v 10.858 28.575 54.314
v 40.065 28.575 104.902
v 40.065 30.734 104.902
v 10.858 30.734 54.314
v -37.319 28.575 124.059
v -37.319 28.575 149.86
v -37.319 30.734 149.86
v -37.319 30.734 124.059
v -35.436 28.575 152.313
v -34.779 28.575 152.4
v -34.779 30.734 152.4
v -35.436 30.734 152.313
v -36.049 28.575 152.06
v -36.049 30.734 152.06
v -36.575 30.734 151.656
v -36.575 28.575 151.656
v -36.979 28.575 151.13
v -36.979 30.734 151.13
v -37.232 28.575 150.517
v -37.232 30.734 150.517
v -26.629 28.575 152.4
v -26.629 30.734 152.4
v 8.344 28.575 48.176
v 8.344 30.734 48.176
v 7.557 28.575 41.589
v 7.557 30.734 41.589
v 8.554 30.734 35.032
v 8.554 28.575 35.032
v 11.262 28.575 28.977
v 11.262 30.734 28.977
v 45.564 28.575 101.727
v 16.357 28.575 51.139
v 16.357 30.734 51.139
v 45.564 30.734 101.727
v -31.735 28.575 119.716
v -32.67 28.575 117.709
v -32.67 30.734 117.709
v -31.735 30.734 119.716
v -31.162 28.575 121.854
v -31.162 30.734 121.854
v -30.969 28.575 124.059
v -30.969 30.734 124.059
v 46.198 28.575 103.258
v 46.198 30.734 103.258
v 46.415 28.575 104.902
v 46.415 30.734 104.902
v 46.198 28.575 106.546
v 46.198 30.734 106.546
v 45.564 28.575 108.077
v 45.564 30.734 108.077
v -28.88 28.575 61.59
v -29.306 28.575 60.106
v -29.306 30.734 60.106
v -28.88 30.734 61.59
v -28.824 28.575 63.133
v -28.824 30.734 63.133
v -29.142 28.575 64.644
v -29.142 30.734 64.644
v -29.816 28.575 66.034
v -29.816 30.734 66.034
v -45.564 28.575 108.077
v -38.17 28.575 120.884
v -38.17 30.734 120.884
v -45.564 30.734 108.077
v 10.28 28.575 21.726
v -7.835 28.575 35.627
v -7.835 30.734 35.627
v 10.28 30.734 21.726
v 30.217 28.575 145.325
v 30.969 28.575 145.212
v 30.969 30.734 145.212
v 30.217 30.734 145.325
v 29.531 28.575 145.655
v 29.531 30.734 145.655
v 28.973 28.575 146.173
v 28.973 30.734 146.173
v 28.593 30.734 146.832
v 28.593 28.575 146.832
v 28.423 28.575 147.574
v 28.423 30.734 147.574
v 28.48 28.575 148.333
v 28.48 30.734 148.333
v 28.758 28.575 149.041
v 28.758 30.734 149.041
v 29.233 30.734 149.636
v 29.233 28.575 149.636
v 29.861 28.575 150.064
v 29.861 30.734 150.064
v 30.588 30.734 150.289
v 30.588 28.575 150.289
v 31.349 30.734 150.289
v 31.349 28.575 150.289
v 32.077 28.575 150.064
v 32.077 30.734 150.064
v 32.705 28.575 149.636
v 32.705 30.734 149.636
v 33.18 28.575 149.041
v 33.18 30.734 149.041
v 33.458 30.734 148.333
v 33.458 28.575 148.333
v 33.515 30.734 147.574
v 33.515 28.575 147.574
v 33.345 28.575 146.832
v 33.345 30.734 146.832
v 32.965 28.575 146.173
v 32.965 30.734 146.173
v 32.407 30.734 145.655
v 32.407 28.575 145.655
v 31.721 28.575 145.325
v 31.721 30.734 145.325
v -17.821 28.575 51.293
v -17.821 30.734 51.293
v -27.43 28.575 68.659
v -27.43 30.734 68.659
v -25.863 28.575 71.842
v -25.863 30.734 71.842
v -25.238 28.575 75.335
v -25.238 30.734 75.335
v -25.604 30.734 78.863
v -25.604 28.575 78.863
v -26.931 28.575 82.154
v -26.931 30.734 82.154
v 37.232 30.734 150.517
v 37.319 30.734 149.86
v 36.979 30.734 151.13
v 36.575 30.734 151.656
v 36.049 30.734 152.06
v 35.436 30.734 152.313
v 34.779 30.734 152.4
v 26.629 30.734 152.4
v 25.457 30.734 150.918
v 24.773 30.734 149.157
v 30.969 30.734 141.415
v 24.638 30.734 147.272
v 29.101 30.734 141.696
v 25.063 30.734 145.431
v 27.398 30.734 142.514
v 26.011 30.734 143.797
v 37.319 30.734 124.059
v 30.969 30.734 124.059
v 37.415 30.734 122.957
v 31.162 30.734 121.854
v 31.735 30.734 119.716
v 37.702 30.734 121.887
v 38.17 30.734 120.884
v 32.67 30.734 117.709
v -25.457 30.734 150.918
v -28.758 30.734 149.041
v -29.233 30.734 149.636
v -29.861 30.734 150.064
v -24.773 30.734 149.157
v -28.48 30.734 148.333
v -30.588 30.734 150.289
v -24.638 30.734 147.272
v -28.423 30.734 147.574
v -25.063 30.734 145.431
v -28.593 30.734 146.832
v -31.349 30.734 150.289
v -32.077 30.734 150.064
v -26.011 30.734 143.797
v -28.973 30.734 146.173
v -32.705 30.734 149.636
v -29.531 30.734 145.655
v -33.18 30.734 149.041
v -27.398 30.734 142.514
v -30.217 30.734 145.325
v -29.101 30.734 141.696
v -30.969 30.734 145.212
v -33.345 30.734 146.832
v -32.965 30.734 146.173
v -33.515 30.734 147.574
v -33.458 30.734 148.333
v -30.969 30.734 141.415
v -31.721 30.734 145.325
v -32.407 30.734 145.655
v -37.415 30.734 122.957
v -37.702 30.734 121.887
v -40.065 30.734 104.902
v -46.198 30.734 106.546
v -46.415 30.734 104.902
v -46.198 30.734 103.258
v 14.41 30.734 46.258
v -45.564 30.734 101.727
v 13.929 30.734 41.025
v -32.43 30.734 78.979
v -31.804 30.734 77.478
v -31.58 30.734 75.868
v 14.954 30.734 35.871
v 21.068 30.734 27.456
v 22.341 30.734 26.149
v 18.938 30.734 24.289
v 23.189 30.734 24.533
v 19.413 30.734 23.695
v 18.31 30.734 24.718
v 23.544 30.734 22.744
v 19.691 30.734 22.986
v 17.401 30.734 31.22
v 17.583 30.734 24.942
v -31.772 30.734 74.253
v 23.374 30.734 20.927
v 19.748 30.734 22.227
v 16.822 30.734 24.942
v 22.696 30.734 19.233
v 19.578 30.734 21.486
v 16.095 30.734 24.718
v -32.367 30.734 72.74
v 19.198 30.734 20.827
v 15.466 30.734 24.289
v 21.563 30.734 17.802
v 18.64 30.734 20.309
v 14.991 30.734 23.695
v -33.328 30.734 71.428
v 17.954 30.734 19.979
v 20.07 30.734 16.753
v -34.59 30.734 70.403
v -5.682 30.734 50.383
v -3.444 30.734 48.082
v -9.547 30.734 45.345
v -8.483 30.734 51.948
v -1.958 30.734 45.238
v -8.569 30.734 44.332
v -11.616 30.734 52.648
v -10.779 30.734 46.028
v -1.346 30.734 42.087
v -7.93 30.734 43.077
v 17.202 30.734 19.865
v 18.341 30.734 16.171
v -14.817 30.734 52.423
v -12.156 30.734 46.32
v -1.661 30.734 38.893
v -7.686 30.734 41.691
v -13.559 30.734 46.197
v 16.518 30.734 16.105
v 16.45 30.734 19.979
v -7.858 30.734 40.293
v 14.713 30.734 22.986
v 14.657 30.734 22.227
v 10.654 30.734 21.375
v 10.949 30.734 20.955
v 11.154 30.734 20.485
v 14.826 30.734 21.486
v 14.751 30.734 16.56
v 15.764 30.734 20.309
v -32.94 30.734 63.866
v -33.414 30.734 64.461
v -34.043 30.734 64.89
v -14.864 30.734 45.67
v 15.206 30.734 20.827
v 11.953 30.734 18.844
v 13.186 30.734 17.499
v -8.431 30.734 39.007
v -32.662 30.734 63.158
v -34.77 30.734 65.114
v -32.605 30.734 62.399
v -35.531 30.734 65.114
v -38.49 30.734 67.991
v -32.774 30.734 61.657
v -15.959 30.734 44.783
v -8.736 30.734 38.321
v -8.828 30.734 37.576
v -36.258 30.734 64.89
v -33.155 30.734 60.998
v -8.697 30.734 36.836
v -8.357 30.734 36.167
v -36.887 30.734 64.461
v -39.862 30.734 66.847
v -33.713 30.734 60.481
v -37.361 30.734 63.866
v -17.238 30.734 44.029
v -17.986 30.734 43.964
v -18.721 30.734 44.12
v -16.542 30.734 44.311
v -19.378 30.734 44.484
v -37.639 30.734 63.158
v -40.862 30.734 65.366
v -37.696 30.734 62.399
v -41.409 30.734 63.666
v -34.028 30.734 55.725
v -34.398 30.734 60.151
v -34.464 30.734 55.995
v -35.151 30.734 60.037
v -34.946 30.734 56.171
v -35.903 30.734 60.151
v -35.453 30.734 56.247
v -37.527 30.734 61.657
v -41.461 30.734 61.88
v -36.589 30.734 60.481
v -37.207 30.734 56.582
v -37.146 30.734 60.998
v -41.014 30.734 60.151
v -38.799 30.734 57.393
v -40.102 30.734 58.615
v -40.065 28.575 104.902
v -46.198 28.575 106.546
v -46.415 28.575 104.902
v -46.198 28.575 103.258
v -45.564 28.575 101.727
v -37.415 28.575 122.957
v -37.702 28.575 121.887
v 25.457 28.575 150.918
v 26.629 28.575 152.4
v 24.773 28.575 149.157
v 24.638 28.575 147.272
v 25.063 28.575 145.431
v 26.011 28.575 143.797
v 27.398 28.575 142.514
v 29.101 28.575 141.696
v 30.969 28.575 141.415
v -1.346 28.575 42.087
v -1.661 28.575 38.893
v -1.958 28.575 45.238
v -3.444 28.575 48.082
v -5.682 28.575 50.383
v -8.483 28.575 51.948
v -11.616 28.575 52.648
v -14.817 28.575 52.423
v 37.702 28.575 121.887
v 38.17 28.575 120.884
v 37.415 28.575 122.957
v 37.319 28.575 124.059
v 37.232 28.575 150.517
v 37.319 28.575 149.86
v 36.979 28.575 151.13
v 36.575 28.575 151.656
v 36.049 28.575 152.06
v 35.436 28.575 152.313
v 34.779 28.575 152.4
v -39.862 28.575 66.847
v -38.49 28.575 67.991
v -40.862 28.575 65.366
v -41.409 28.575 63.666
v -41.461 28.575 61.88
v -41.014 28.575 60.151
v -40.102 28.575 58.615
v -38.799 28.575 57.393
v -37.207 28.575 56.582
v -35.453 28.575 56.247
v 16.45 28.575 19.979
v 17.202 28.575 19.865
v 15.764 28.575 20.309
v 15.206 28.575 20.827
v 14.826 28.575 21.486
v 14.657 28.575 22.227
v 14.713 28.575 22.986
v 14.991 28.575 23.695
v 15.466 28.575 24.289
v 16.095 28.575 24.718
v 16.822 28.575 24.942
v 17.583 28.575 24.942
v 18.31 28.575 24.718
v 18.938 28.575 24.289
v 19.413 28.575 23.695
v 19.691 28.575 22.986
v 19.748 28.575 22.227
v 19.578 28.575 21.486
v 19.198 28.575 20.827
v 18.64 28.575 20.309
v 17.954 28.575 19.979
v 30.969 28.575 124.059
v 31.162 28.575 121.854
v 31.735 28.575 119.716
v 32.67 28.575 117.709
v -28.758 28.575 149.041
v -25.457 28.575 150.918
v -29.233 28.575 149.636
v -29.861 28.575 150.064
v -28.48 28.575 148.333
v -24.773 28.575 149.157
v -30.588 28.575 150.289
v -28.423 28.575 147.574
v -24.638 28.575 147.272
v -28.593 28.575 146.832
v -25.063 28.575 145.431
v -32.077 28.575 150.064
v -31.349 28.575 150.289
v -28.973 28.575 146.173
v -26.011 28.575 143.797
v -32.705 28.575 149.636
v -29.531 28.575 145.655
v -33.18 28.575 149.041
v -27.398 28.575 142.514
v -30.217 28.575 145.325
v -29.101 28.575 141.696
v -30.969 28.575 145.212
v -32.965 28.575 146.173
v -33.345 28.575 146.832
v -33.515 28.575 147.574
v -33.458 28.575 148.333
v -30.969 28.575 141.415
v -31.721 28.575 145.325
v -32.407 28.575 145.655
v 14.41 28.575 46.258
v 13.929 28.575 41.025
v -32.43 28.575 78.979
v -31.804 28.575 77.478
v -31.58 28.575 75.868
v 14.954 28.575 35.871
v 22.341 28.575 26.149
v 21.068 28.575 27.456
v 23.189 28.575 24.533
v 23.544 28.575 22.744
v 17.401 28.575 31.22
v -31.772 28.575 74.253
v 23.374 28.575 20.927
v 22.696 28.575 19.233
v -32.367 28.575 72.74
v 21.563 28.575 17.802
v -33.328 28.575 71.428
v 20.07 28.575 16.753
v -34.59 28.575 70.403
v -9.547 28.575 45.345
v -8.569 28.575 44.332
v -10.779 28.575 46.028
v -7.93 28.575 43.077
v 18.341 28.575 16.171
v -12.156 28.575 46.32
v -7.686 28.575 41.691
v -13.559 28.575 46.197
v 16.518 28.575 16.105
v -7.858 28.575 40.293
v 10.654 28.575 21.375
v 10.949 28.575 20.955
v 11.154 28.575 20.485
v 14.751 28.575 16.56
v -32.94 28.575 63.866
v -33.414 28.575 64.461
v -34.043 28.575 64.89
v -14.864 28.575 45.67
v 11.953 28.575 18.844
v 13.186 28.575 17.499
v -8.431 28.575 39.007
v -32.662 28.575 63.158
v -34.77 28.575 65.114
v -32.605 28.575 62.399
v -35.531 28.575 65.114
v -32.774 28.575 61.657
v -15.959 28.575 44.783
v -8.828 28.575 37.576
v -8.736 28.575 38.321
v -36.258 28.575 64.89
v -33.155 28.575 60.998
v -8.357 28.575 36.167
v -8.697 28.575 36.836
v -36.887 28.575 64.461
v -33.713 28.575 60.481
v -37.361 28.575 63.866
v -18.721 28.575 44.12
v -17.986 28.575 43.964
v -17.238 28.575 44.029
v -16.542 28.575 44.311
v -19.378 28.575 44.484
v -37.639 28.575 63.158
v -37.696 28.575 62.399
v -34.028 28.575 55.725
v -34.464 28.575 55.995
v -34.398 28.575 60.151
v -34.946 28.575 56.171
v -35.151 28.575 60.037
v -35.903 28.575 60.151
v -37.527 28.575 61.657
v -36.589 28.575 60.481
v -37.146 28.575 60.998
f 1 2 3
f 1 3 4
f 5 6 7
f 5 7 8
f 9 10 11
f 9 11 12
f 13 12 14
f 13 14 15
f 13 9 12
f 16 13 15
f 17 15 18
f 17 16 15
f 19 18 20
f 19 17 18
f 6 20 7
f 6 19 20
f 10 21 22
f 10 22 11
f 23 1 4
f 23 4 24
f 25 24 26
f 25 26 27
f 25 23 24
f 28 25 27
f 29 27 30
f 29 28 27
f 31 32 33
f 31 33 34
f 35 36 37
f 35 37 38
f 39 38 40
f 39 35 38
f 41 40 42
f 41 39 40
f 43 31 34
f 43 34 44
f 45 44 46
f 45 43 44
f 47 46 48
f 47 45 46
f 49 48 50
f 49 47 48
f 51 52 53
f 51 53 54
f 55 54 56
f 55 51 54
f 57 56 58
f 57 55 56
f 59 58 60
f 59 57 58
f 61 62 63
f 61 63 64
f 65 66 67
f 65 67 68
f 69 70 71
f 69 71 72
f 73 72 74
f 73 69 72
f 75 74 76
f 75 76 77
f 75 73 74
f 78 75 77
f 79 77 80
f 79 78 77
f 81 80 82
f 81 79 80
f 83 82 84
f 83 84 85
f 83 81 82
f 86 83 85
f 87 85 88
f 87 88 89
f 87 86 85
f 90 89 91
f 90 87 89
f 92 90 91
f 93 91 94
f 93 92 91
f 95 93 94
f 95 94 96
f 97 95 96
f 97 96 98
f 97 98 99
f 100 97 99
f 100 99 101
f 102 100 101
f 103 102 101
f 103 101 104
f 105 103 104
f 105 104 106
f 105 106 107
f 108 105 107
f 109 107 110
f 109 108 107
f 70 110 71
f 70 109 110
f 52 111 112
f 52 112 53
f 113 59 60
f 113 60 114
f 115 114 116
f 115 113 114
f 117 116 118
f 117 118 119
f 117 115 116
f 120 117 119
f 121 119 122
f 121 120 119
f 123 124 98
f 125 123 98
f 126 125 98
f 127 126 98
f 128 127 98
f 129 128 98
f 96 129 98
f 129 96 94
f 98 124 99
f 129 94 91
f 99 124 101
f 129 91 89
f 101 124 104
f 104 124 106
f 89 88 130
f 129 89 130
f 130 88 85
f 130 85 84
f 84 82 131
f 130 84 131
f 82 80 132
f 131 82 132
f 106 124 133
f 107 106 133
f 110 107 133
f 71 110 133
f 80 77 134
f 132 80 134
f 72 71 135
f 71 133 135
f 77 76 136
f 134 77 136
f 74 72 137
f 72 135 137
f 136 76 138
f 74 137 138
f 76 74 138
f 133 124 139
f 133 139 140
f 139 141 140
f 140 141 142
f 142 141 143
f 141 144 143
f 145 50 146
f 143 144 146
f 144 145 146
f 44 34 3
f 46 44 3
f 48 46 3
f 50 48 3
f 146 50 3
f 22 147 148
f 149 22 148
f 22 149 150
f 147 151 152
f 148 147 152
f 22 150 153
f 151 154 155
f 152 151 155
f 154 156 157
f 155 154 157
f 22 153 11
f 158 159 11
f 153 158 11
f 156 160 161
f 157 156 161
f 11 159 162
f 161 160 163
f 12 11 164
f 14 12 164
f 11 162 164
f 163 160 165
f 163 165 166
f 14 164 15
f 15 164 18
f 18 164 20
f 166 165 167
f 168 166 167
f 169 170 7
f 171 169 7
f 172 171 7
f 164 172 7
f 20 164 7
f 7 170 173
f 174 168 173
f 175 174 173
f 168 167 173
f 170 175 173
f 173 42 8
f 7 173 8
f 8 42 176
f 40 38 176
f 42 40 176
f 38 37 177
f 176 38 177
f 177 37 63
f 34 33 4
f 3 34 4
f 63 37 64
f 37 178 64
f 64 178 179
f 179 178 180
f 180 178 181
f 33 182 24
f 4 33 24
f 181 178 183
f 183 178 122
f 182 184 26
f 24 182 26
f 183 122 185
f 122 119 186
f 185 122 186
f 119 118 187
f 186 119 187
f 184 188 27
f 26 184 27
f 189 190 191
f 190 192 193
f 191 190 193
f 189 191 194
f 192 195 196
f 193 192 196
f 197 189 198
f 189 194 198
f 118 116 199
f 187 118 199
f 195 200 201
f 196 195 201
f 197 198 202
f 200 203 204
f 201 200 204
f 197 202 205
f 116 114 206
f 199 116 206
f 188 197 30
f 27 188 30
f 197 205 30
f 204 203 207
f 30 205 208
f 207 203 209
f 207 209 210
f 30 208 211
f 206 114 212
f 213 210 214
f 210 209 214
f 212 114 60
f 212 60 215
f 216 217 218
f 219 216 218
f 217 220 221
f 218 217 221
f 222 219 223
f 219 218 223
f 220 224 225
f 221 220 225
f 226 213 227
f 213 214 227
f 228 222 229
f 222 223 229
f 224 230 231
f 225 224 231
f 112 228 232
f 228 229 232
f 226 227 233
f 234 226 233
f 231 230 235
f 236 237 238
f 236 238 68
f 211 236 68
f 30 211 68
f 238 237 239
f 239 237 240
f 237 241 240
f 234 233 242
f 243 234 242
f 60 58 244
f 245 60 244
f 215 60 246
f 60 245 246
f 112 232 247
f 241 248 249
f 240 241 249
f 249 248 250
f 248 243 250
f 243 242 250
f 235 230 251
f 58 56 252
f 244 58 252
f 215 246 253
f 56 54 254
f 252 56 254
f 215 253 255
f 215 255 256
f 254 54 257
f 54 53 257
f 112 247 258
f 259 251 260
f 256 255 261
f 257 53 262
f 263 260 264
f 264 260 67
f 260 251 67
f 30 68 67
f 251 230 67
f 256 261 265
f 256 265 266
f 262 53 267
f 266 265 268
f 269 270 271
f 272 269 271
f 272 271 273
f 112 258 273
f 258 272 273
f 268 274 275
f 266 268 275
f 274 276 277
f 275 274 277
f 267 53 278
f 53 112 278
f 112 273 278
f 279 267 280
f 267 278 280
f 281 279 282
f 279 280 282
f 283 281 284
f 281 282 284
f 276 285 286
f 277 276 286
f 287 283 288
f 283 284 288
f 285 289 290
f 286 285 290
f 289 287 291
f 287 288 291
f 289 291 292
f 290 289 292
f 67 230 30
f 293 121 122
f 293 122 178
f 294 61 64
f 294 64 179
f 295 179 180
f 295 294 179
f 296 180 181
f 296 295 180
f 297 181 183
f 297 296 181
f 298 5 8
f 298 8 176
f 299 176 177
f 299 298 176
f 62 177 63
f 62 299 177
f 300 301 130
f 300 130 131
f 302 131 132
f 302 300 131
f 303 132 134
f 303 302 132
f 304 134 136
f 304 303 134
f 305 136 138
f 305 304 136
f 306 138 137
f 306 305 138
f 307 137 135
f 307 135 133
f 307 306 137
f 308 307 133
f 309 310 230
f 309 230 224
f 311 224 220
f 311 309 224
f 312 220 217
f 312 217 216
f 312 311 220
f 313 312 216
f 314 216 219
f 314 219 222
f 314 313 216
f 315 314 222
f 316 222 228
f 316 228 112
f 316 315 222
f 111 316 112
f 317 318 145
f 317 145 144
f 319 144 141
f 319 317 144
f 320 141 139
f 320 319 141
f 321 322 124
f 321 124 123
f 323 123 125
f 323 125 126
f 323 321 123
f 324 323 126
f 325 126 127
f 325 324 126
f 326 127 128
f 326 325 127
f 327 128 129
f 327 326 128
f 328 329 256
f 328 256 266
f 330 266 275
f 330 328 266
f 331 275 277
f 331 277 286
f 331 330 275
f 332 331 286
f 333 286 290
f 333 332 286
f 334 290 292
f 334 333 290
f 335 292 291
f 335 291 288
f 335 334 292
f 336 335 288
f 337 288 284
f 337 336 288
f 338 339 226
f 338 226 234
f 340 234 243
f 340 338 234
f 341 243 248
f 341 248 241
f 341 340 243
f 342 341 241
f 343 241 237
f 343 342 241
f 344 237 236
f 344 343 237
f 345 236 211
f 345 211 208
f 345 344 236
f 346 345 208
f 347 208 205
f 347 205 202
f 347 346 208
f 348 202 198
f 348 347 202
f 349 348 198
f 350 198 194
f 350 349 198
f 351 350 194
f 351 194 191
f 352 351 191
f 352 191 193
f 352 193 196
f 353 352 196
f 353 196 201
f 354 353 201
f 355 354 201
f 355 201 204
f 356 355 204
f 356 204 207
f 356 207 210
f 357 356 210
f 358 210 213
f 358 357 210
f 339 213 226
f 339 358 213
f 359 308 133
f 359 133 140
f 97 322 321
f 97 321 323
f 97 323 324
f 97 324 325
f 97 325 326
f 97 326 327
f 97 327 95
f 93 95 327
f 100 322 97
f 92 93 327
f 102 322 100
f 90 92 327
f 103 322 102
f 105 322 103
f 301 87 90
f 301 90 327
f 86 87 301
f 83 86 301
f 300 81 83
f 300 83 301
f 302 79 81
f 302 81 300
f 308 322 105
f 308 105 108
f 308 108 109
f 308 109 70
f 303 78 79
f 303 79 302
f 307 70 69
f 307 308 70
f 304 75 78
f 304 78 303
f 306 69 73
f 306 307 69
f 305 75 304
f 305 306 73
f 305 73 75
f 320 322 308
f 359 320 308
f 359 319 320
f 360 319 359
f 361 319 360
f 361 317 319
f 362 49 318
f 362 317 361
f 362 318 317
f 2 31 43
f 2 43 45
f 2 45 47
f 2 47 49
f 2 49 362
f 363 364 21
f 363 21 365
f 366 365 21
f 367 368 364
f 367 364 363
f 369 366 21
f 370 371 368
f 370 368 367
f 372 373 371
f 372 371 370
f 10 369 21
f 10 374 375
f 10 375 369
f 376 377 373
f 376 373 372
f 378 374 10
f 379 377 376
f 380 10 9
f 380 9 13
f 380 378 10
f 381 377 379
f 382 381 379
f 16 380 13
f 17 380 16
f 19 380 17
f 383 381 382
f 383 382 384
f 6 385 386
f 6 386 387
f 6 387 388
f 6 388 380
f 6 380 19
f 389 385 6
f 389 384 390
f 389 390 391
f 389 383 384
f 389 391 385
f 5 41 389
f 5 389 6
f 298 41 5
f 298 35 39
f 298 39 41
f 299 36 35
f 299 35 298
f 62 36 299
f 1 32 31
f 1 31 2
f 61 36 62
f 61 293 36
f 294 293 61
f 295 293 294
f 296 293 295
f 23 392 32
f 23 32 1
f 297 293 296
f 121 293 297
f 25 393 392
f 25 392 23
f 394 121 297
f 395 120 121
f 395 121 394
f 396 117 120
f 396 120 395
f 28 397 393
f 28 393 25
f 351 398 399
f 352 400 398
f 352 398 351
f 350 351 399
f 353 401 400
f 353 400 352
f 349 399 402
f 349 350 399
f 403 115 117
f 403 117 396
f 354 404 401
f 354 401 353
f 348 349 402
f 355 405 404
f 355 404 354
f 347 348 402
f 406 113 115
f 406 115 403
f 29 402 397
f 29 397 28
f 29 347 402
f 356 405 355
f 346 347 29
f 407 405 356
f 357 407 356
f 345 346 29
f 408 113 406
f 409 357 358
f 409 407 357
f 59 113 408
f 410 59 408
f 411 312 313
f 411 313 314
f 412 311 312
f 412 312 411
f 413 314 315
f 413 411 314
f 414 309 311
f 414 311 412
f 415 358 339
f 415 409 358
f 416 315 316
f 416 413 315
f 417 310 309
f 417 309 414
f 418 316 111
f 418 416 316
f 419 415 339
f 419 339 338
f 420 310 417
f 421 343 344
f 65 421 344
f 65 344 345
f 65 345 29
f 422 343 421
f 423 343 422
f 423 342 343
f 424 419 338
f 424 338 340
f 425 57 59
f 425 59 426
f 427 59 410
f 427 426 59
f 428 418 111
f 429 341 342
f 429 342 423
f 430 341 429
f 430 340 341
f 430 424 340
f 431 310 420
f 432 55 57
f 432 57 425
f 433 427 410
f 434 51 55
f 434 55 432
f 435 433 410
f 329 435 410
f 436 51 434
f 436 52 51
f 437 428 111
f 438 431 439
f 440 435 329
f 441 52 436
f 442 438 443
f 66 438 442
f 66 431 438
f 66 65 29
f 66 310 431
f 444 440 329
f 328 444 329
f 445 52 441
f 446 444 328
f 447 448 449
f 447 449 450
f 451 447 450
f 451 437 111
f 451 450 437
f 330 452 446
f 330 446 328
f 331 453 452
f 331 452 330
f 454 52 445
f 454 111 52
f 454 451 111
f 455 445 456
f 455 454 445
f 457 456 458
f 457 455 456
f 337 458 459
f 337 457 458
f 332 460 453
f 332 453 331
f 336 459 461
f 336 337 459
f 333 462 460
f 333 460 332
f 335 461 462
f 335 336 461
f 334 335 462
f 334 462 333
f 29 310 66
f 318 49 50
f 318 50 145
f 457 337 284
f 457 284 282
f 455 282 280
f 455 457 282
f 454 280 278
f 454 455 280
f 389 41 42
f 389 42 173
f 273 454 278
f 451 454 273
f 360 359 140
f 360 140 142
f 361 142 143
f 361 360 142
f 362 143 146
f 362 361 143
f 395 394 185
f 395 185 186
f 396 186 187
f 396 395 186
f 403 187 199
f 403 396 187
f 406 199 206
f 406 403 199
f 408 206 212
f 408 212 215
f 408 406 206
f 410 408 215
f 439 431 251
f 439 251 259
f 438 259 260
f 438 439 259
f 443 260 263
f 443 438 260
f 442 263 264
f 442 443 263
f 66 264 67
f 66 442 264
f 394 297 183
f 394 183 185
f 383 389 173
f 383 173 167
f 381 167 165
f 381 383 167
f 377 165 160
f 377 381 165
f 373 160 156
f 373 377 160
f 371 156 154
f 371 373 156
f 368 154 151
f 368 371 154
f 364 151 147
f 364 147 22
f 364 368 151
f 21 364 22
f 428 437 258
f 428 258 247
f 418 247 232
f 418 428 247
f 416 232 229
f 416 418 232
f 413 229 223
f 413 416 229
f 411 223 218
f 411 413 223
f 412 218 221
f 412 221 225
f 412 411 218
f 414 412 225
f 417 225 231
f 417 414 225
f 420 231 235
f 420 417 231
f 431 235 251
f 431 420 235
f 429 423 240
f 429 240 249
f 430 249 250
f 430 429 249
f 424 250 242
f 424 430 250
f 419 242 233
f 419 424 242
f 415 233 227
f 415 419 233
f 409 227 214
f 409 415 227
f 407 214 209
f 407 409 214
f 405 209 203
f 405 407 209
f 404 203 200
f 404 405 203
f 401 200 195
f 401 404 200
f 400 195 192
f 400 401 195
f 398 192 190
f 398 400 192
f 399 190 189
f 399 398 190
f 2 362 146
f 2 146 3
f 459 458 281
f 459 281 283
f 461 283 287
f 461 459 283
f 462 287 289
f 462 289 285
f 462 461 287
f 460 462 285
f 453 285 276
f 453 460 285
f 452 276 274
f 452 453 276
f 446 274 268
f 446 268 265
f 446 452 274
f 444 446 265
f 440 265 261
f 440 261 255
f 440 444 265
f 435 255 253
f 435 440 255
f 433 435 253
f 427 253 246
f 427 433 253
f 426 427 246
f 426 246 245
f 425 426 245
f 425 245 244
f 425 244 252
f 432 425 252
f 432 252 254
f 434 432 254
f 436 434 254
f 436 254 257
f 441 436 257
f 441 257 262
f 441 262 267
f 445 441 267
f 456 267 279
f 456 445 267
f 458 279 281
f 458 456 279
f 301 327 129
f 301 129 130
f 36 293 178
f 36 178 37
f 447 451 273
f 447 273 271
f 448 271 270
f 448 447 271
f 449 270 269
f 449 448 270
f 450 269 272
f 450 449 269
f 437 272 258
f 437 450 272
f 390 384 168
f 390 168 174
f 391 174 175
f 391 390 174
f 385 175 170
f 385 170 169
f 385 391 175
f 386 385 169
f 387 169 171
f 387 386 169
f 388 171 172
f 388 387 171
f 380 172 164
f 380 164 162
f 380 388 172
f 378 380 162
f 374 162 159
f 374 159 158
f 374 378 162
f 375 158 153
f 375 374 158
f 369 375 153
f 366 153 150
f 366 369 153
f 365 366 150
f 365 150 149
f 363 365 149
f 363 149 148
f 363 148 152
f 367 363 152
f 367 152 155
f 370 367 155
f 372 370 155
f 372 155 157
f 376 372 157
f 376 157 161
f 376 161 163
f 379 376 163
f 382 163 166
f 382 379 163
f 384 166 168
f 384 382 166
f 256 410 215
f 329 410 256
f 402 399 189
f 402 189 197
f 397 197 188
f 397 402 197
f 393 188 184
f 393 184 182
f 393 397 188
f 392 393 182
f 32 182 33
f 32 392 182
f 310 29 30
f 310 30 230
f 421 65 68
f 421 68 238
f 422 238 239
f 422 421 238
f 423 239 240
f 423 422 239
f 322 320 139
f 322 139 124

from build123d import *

# Parameters (mm, degrees)
SKETCH44_R              = 2.5527
TOP_PLATE_EXTRUDE_DEPTH = 3.175
SKETCH82_R              = 4.7625
CUT_EXTRUDE38_DEPTH     = 3.175
SKETCH72_W              = 4.7498
SKETCH72_H              = 17.4625
SKETCH72_W_2            = 49.2125
SKETCH72_H_2            = 3.0226
SKETCH72_H_3            = 18.806813894
SKETCH72_W_3            = 12.7
SKETCH72_H_4            = 9.525
BOSS_EXTRUDE27_DEPTH    = 3.175
SKETCH86_R              = 6.35
SKETCH86_R_2            = 2.5527
BOSS_EXTRUDE31_DEPTH    = 3.175
SKETCH111_W             = 17.7673
SKETCH111_H             = 10.0965
CUT_EXTRUDE57_DEPTH     = 191.266761417
SKETCH92_W              = 4.859785226
SKETCH92_H              = 15.6845
SKETCH92_W_2            = 4.8768
SKETCH92_H_2            = 22.987
SKETCH92_W_3            = 6.1468
SKETCH92_H_3            = 3.1496
SKETCH92_W_4            = 13.95095
SKETCH92_W_5            = 15.24635
CUT_EXTRUDE44_DEPTH     = 191.266761417
SKETCH95_R              = 2.5527
CUT_EXTRUDE47_DEPTH     = 25.4
SKETCH99_R              = 3.175
CUT_EXTRUDE50_DEPTH     = 191.266761417
CUT_EXTRUDE58_DEPTH     = 191.266761417
SKETCH115_W             = 1.905
SKETCH115_H             = 7.409255477
CUT_EXTRUDE60_DEPTH     = 191.266761417
FILLET5_R               = 2.54
FILLET6_R               = 2.54
FILLET7_R               = 2.54
FILLET8_R               = 1.905
SKETCH113_R             = 0.508
CUT_EXTRUDE59_DEPTH     = 191.266761558
FILLET43_R              = 0.635
FILLET43_OF_MIRROR29_R  = 0.635
BOSS_EXTRUDE32_START    = 2.159
SKETCH116_R             = 2.5527
BOSS_EXTRUDE32_DEPTH    = 3.175
CUT_EXTRUDE61_DEPTH     = 191.315032208
BOSS_EXTRUDE33_START    = 3.175
SKETCH118_R             = 2.5527
BOSS_EXTRUDE33_DEPTH    = 3.175
SKETCH119_R             = 2.5527
CUT_EXTRUDE62_DEPTH     = 191.43046765
CUT_EXTRUDE63_DEPTH     = 191.43046765
DELETEFACE1_START       = 30.734
DELETEFACE1_OUTLINE_R   = 2.5527
DELETEFACE1_DEPTH       = 3.175
CUT_EXTRUDE64_DEPTH     = 191.43046765
FILLET44_R              = 6.35
FILLET45_R              = 1.27
FILLET46_R              = 1.27
FILLET47_R              = 3.175
FILLET48_R              = 3.175
FILLET49_R              = 2.54
SKETCH122_R             = 2.5527
BOSS_EXTRUDE34_DEPTH    = 2.159


# Read off the part's stored shape, not the designer's step: DeleteFace1
with BuildPart() as part:
    # Sketch44 → Top Plate Extrude----------- (new body)
    with BuildSketch(Plane(origin=(0, 25.4, 0), x_dir=(1, 0, 0), z_dir=(0, 1, 0))):
        with BuildLine():
            Line((-104.775, -68.124686106), (-104.775, -152.527))
            Line((-104.775, -152.527), (104.775, -152.527))
            Line((104.775, -152.527), (104.775, -68.124686106))
            Line((104.775, -68.124686106), (92.075, -68.124686106))
            Line((92.075, -68.124686106), (92.075, -62.647632589))
            Line((92.075, -62.647632589), (21.81178084, -8.732768266))
            ThreePointArc((21.81178084, -8.732768266), (18.724426226, -14.191930366), (14.302849775, -18.63983673))
            Line((14.302849775, -18.63983673), (-38.049902469, -58.811516421))
            ThreePointArc((-38.049902469, -58.811516421), (-44.800532006, -62.419803084), (-52.352752243, -63.666679691))
            Line((-52.352752243, -63.666679691), (-92.075, -63.666679691))
            Line((-92.075, -63.666679691), (-92.075, -68.124686106))
            Line((-92.075, -68.124686106), (-104.775, -68.124686106))
        make_face()
        with Locations(Location((-73.83145, -147.7645, 0), (0, 0, 90))):
            Circle(SKETCH44_R, mode=Mode.SUBTRACT)
        with Locations(Location((-59.54395, -147.7645, 0), (0, 0, 90))):
            Circle(SKETCH44_R, mode=Mode.SUBTRACT)
        with Locations(Location((-45.25645, -147.7645, 0), (0, 0, 90))):
            Circle(SKETCH44_R, mode=Mode.SUBTRACT)
        with Locations(Location((-30.96895, -147.7645, 0), (0, 0, 90))):
            Circle(SKETCH44_R, mode=Mode.SUBTRACT)
        with Locations(Location((-100.0125, -99.6315, 0), (0, 0, 270))):
            Circle(SKETCH44_R, mode=Mode.SUBTRACT)
        with Locations(Location((-100.0125, -147.7645, 0), (0, 0, 270))):
            Circle(SKETCH44_R, mode=Mode.SUBTRACT)
        with Locations(Location((100.0125, -147.7645, 0), (0, 0, 90))):
            Circle(SKETCH44_R, mode=Mode.SUBTRACT)
        with Locations(Location((100.0125, -99.6315, 0), (0, 0, 90))):
            Circle(SKETCH44_R, mode=Mode.SUBTRACT)
        with Locations(Location((30.96895, -147.7645, 0), (0, 0, 270))):
            Circle(SKETCH44_R, mode=Mode.SUBTRACT)
        with Locations(Location((45.25645, -147.7645, 0), (0, 0, 270))):
            Circle(SKETCH44_R, mode=Mode.SUBTRACT)
        with Locations(Location((59.54395, -147.7645, 0), (0, 0, 270))):
            Circle(SKETCH44_R, mode=Mode.SUBTRACT)
        with Locations(Location((73.83145, -147.7645, 0), (0, 0, 270))):
            Circle(SKETCH44_R, mode=Mode.SUBTRACT)
        with Locations(Location((-87.3125, -68.429179691, 0), (0, 0, 270))):
            Circle(SKETCH44_R, mode=Mode.SUBTRACT)
        with Locations(Location((-35.150676163, -62.589861704, 0), (0, 0, 270))):
            Circle(SKETCH44_R, mode=Mode.SUBTRACT)
        with Locations(Location((17.20207608, -22.418182013, 0), (0, 0, 270))):
            Circle(SKETCH44_R, mode=Mode.SUBTRACT)
        with Locations(Location((45.531325629, -32.936414996, 0), (0, 0, 270))):
            Circle(SKETCH44_R, mode=Mode.SUBTRACT)
        with Locations(Location((87.3125, -64.996237681, 0), (0, 0, 270))):
            Circle(SKETCH44_R, mode=Mode.SUBTRACT)
        with Locations(Location((-97.155, -85.269686106, 0), (0, 0, 270))):
            Circle(SKETCH44_R, mode=Mode.SUBTRACT)
        with Locations(Location((24.42940612, -36.754342231, 0), (0, 0, 270))):
            Circle(SKETCH44_R, mode=Mode.SUBTRACT)
        with Locations(Location((97.155, -85.269686106, 0), (0, 0, 270))):
            Circle(SKETCH44_R, mode=Mode.SUBTRACT)
    extrude(amount=TOP_PLATE_EXTRUDE_DEPTH)

    # Sketch82 → Cut-Extrude38 (cut)
    with BuildSketch(Plane(origin=(0, 28.575, 0), x_dir=(1, 0, 0), z_dir=(0, 1, 0))):
        with Locations((-52.352752243, -65.571679691)):
            Circle(SKETCH82_R)
        with Locations((-12.44667807, -41.56667131)):
            Circle(SKETCH82_R)
        with Locations((58.296246284, -39.129483192)):
            Circle(SKETCH82_R)
        with BuildLine():
            Line((21.464274093, -9.555101394), (21.81178084, -8.732768266))
            Line((21.81178084, -8.732768266), (22.214272521, -9.041610995))
            ThreePointArc((22.214272521, -9.041610995), (27.20799018, -17.139845005), (21.464274093, -9.555101394))
        make_face()
    extrude(amount=-CUT_EXTRUDE38_DEPTH, mode=Mode.SUBTRACT)

    # Sketch72 → Boss-Extrude27 (add, through all)
    with BuildSketch(Plane(origin=(0, 25.4, 0), x_dir=(1, 0, 0), z_dir=(0, 1, 0))):
        with Locations((-107.1499, -143.79575)):
            Rectangle(SKETCH72_W, SKETCH72_H)
        with Locations((-52.4002, -154.0383)):
            Rectangle(SKETCH72_W_2, SKETCH72_H_2)
        with Locations((-107.1499, -102.928093053)):
            Rectangle(SKETCH72_W, SKETCH72_H_3)
        with Locations((-6.35, -154.0383)):
            Rectangle(SKETCH72_W_3, SKETCH72_H_2)
        with Locations((-107.1499, -72.887186106)):
            Rectangle(SKETCH72_W, SKETCH72_H_4)
        with Locations((-97.155, -154.0383)):
            Rectangle(SKETCH72_W_3, SKETCH72_H_2)
    boss_extrude27 = extrude(amount=BOSS_EXTRUDE27_DEPTH)

    # Mirror22: Boss-Extrude27 across plane
    add(boss_extrude27.mirror(Plane(origin=(0, 0, 0), x_dir=(0, 0, 1), z_dir=(1, 0, 0))))

    # Sketch86 → Boss-Extrude31 (add, through all)
    # profile 1 of 5: a face of its own
    with BuildSketch(Plane(origin=(0, 28.575, 0), x_dir=(1, 0, 0), z_dir=(0, 1, 0))):
        with Locations((87.3125, -64.996237681)):
            Circle(SKETCH86_R)
        with Locations(Location((87.3125, -64.996237681, 0), (0, 0, 270))):
            Circle(SKETCH86_R_2, mode=Mode.SUBTRACT)
    # profile 2 of 5: a face of its own
    with BuildSketch(Plane(origin=(0, 28.575, 0), x_dir=(1, 0, 0), z_dir=(0, 1, 0))):
        with Locations((17.20207608, -22.418182013)):
            Circle(SKETCH86_R)
        with Locations(Location((17.20207608, -22.418182013, 0), (0, 0, 270))):
            Circle(SKETCH86_R_2, mode=Mode.SUBTRACT)
    # profile 3 of 5: a face of its own
    with BuildSketch(Plane(origin=(0, 28.575, 0), x_dir=(1, 0, 0), z_dir=(0, 1, 0))):
        with Locations((45.531325629, -32.936414996)):
            Circle(SKETCH86_R)
        with Locations(Location((45.531325629, -32.936414996, 0), (0, 0, 270))):
            Circle(SKETCH86_R_2, mode=Mode.SUBTRACT)
    # profile 4 of 5: a face of its own
    with BuildSketch(Plane(origin=(0, 28.575, 0), x_dir=(1, 0, 0), z_dir=(0, 1, 0))):
        with Locations((-35.150676163, -62.589861704)):
            Circle(SKETCH86_R)
        with Locations(Location((-35.150676163, -62.589861704, 0), (0, 0, 270))):
            Circle(SKETCH86_R_2, mode=Mode.SUBTRACT)
    # profile 5 of 5: a face of its own
    with BuildSketch(Plane(origin=(0, 28.575, 0), x_dir=(1, 0, 0), z_dir=(0, 1, 0))):
        with Locations((-87.3125, -68.429179691)):
            Circle(SKETCH86_R)
        with Locations(Location((-87.3125, -68.429179691, 0), (0, 0, 270))):
            Circle(SKETCH86_R_2, mode=Mode.SUBTRACT)
    extrude(amount=-BOSS_EXTRUDE31_DEPTH)

    # Sketch111 → Cut-Extrude57 (cut, through all)
    with BuildSketch(Plane(origin=(0, 28.575, 0), x_dir=(1, 0, 0), z_dir=(0, 1, 0))):
        with Locations((-100.64115, -72.918936106)):
            Rectangle(SKETCH111_W, SKETCH111_H)
        with Locations((100.64115, -72.918936106)):
            Rectangle(SKETCH111_W, SKETCH111_H)
    extrude(amount=-CUT_EXTRUDE57_DEPTH, mode=Mode.SUBTRACT)

    # Sketch92 → Cut-Extrude44 (cut, through all)
    with BuildSketch(Plane(origin=(0, 28.575, 0), x_dir=(1, 0, 0), z_dir=(0, 1, 0))):
        with Locations((-107.094907387, -85.809436106)):
            Rectangle(SKETCH92_W, SKETCH92_H)
        with Locations((-107.0864, -123.698)):
            Rectangle(SKETCH92_W_2, SKETCH92_H_2)
        with Locations((-106.4514, -153.9748)):
            Rectangle(SKETCH92_W_3, SKETCH92_H_3)
        with Locations((-83.905725, -153.9748)):
            Rectangle(SKETCH92_W_4, SKETCH92_H_3)
        with Locations((-20.246975, -153.9748)):
            Rectangle(SKETCH92_W_5, SKETCH92_H_3)
    cut_extrude44 = extrude(amount=-CUT_EXTRUDE44_DEPTH, mode=Mode.SUBTRACT)

    # Mirror26: Cut-Extrude44 across plane
    add(cut_extrude44.mirror(Plane(origin=(0, 0, 0), x_dir=(0, 0, 1), z_dir=(1, 0, 0))), mode=Mode.SUBTRACT)

    # Sketch95 → Cut-Extrude47 (cut)
    with BuildSketch(Plane(origin=(0, 28.575, 0), x_dir=(1, 0, 0), z_dir=(0, 1, 0))):
        with BuildLine():
            Line((-14.966768676, -141.097), (14.966768676, -141.097))
            ThreePointArc((14.966768676, -141.097), (18.013644543, -132.45695017), (26.522246674, -135.853654954))
            Line((26.522246674, -135.853654954), (44.392192993, -104.902))
            Line((44.392192993, -104.902), (26.522246674, -73.950345046))
            ThreePointArc((26.522246674, -73.950345046), (18.013644543, -77.34704983), (14.966768676, -68.707))
            Line((14.966768676, -68.707), (-14.966768676, -68.707))
            ThreePointArc((-14.966768676, -68.707), (-18.013644543, -77.34704983), (-26.522246674, -73.950345046))
            Line((-26.522246674, -73.950345046), (-44.392192993, -104.902))
            Line((-44.392192993, -104.902), (-26.522246674, -135.853654954))
            ThreePointArc((-26.522246674, -135.853654954), (-18.013644543, -132.45695017), (-14.966768676, -141.097))
        make_face()
        with Locations(Location((-20.6375, -71.5645, 0), (0, 0, 270))):
            Circle(SKETCH95_R)
        with Locations(Location((20.6375, -71.5645, 0), (0, 0, 270))):
            Circle(SKETCH95_R)
        with Locations(Location((20.6375, -138.2395, 0), (0, 0, 270))):
            Circle(SKETCH95_R)
        with Locations(Location((-20.6375, -138.2395, 0), (0, 0, 270))):
            Circle(SKETCH95_R)
    extrude(amount=-CUT_EXTRUDE47_DEPTH, mode=Mode.SUBTRACT)

    # Sketch99 → Cut-Extrude50 (cut, through all)
    with BuildSketch(Plane(origin=(0, 28.575, 0), x_dir=(1, 0, 0), z_dir=(0, 1, 0))):
        with Locations(Location((-1.83388, -60.19546, 0), (0, 0, 270))):
            Circle(SKETCH99_R)
    extrude(amount=-CUT_EXTRUDE50_DEPTH, mode=Mode.SUBTRACT)

    # Sketch112 → Cut-Extrude58 (cut, through all)
    with BuildSketch(Plane(origin=(0, 28.575, 0), x_dir=(1, 0, 0), z_dir=(0, 1, 0))):
        Polygon((-26.522246674, -135.853654954), (-24.61895, -139.150261495), (-24.61895, -152.4), (-24.61895, -155.5496), (24.61895, -155.5496), (24.61895, -152.4), (24.61895, -139.150261495), (26.522246674, -135.853654954), (26.522246674, -131.8895), (-26.522246674, -131.8895), align=None)
    extrude(amount=-CUT_EXTRUDE58_DEPTH, mode=Mode.SUBTRACT)

    # Sketch115 → Cut-Extrude60 (cut, through all)
    with BuildSketch(Plane(origin=(0, 28.575, 0), x_dir=(1, 0, 0), z_dir=(0, 1, 0))):
        with BuildLine():
            Line((-91.7575, -67.870686106), (-93.637892076, -67.870686106))
            Line((-93.637892076, -67.870686106), (-93.637892076, -63.666679691))
            Line((-93.637892076, -63.666679691), (-91.7575, -63.666679691))
            Line((-91.7575, -63.666679691), (-91.512630206, -63.666679691))
            ThreePointArc((-91.512630206, -63.666679691), (-91.636564071, -63.778914117), (-91.7575, -63.894372639))
            Line((-91.7575, -63.894372639), (-91.7575, -67.870686106))
        make_face()
        with Locations((92.71, -64.166058367)):
            Rectangle(SKETCH115_W, SKETCH115_H)
    extrude(amount=-CUT_EXTRUDE60_DEPTH, mode=Mode.SUBTRACT)

    # Fillet5
    fillet5_edges = [part.edges().sort_by_distance(p)[0] for p in [
        (-44.392192993, 26.9875, 104.902),
        (-26.522246674, 26.9875, 73.950345046),
        (-14.966768676, 26.9875, 68.707),
        (14.966768676, 26.9875, 68.707),
        (26.522246674, 26.9875, 73.950345046),
        (44.392192993, 26.9875, 104.902),
        (24.61895, 26.9875, 139.150261495),
        (-24.61895, 26.9875, 139.150261495),
    ]]
    fillet(fillet5_edges, radius=FILLET5_R)

    # Fillet6
    fillet6_edges = [part.edges().sort_by_distance(p)[0] for p in [
        (-91.7575, 26.9875, 63.894372639),
        (91.7575, 26.9875, 60.461430629),
    ]]
    fillet(fillet6_edges, radius=FILLET6_R)

    # Fillet7
    fillet7_edges = [part.edges().sort_by_distance(p)[0] for p in [
        (-56.717655593, 26.9875, 63.666679691),
        (-17.069279245, 26.9875, 42.712517997),
        (-10.14345794, 26.9875, 37.398148396),
        (55.993026154, 26.9875, 34.960960278),
        (62.918847459, 26.9875, 40.275329879),
        (-48.171509306, 26.9875, 63.291632816),
        (29.140093826, 26.9875, 14.355980596),
        (86.879538977, 26.9875, 58.661015131),
        (17.141153982, 26.9875, 16.068474264),
        (10.970662446, 26.9875, 21.196713997),
        (51.762739264, 26.9875, 31.71494698),
        (45.098364606, 26.9875, 26.601192447),
        (-41.268255068, 26.9875, 60.88759018),
        (-34.71771514, 26.9875, 56.254639155),
        (-83.112369794, 26.9875, 63.666679691),
        (-104.665014774, 26.9875, 77.967186106),
        (104.665014774, 26.9875, 77.967186106),
    ]]
    fillet(fillet7_edges, radius=FILLET7_R)

    # Fillet8
    fillet8_edges = [part.edges().sort_by_distance(p)[0] for p in [
        (19.785658887, 26.9875, 12.670545663),
    ]]
    fillet(fillet8_edges, radius=FILLET8_R)

    # Sketch113 → Cut-Extrude59 (cut, through all)
    with BuildSketch(Plane(origin=(0, 28.575, 0), x_dir=(1, 0, 0), z_dir=(0, 1, 0))):
        with Locations((-91.7575, -77.967186106)):
            Circle(SKETCH113_R)
        with Locations((-104.665014774, -93.651686106)):
            Circle(SKETCH113_R)
        with Locations((-104.648, -112.2045)):
            Circle(SKETCH113_R)
        with Locations((-104.648, -135.1915)):
            Circle(SKETCH113_R)
        with Locations((-103.378, -152.4)):
            Circle(SKETCH113_R)
        with Locations((-90.8812, -152.4)):
            Circle(SKETCH113_R)
        with Locations((-76.93025, -152.4)):
            Circle(SKETCH113_R)
        with Locations((-27.87015, -152.4)):
            Circle(SKETCH113_R)
    cut_extrude59 = extrude(amount=-CUT_EXTRUDE59_DEPTH, mode=Mode.SUBTRACT)

    # Fillet43
    fillet43_edges = [part.edges().sort_by_distance(p)[0] for p in [
        (-103.886, 26.9875, 152.4),
        (-76.93025, 26.9875, 152.908),
        (-90.3732, 26.9875, 152.4),
        (-105.156, 26.9875, 135.1915),
        (-104.648, 26.9875, 112.7125),
        (-27.36215, 26.9875, 152.4),
        (-105.173014774, 26.9875, 93.651686106),
        (-91.7575, 26.9875, 77.459186106),
        (-92.2655, 26.9875, 77.967186106),
        (-104.665014774, 26.9875, 93.143686106),
        (-105.156, 26.9875, 112.2045),
        (-104.648, 26.9875, 134.6835),
        (-103.378, 26.9875, 152.908),
        (-90.8812, 26.9875, 152.908),
        (-77.43825, 26.9875, 152.4),
        (-27.87015, 26.9875, 152.908),
    ]]
    fillet(fillet43_edges, radius=FILLET43_R)

    # Mirror29: Cut-Extrude59 across plane
    add(cut_extrude59.mirror(Plane(origin=(0, 0, 0), x_dir=(0, 0, 1), z_dir=(1, 0, 0))), mode=Mode.SUBTRACT)

    # Fillet43 of Mirror29
    fillet43_of_mirror29_edges = [part.edges().sort_by_distance(p)[0] for p in [
        (103.886, 26.9875, 152.4),
        (76.93025, 26.9875, 152.908),
        (90.3732, 26.9875, 152.4),
        (105.156, 26.9875, 135.1915),
        (104.648, 26.9875, 112.7125),
        (27.36215, 26.9875, 152.4),
        (105.173014774, 26.9875, 93.651686106),
        (91.7575, 26.9875, 77.459186106),
        (92.2655, 26.9875, 77.967186106),
        (104.665014774, 26.9875, 93.143686106),
        (105.156, 26.9875, 112.2045),
        (104.648, 26.9875, 134.6835),
        (103.378, 26.9875, 152.908),
        (90.8812, 26.9875, 152.908),
        (77.43825, 26.9875, 152.4),
        (27.87015, 26.9875, 152.908),
    ]]
    fillet(fillet43_of_mirror29_edges, radius=FILLET43_OF_MIRROR29_R)

    # Sketch117 → Cut-Extrude61 (cut, through all)
    with BuildSketch(Plane(origin=(0, 28.575, 0), x_dir=(1, 0, 0), z_dir=(0, 1, 0))):
        with BuildLine():
            Line((26.828159473, -37.627417051), (25.525062727, -41.207645937))
            ThreePointArc((25.525062727, -41.207645937), (22.253234554, -42.73332447), (20.727556021, -39.461496297))
            Line((20.727556021, -39.461496297), (22.030652767, -35.881267412))
            ThreePointArc((22.030652767, -35.881267412), (25.30248094, -34.355588878), (26.828159473, -37.627417051))
        make_face()
        with BuildLine():
            Line((1.34112, -60.19546), (1.34112, -61.78296))
            ThreePointArc((1.34112, -61.78296), (-1.83388, -64.95796), (-5.00888, -61.78296))
            Line((-5.00888, -61.78296), (-5.00888, -60.19546))
            ThreePointArc((-5.00888, -60.19546), (-1.83388, -57.02046), (1.34112, -60.19546))
        make_face()
    extrude(amount=-CUT_EXTRUDE61_DEPTH, mode=Mode.SUBTRACT)

    # Sketch119 → Cut-Extrude62 (cut, through all)
    with BuildSketch(Plane.XZ.offset(-25.4)):
        with BuildLine():
            ThreePointArc((-24.618334265, 76.511767787), (-26.67742503, 75.993929451), (-28.410372496, 77.220674902))
            Line((-28.410372496, 77.220674902), (-28.410372496, 59.418844751))
            Line((-28.410372496, 59.418844751), (-16.707657981, 50.439036071))
            ThreePointArc((-16.707657981, 50.439036071), (-6.454943705, 49.375251561), (-2.773809056, 39.747217744))
            Line((-2.773809056, 39.747217744), (3.843489743, 34.669585789))
            Line((3.843489743, 34.669585789), (28.410372496, 77.220674902))
            ThreePointArc((28.410372496, 77.220674902), (26.67742503, 75.993929451), (24.618334265, 76.511767787))
            ThreePointArc((24.618334265, 76.511767787), (17.793005442, 77.24176613), (14.291551037, 71.337714286))
            ThreePointArc((14.291551037, 71.337714286), (13.581013661, 69.48331271), (11.753171452, 68.707))
            Line((11.753171452, 68.707), (-11.753171452, 68.707))
            ThreePointArc((-11.753171452, 68.707), (-13.581013661, 69.48331271), (-14.291551037, 71.337714286))
            ThreePointArc((-14.291551037, 71.337714286), (-17.793005442, 77.24176613), (-24.618334265, 76.511767787))
        make_face()
        with BuildLine():
            Line((1.34112, 61.78296), (1.34112, 60.19546))
            ThreePointArc((1.34112, 60.19546), (-1.83388, 57.02046), (-5.00888, 60.19546))
            Line((-5.00888, 60.19546), (-5.00888, 61.78296))
            ThreePointArc((-5.00888, 61.78296), (-1.83388, 64.95796), (1.34112, 61.78296))
        make_face(mode=Mode.SUBTRACT)
        with Locations(Location((-20.6375, 71.5645, 0), (0, 0, 90))):
            Circle(SKETCH119_R, mode=Mode.SUBTRACT)
        with Locations(Location((20.6375, 71.5645, 0), (0, 0, 90))):
            Circle(SKETCH119_R, mode=Mode.SUBTRACT)
    extrude(amount=-CUT_EXTRUDE62_DEPTH, mode=Mode.SUBTRACT)

    # Sketch120 → Cut-Extrude63 (cut, through all)
    with BuildSketch(Plane.XZ.offset(-25.4)):
        with BuildLine():
            Line((-10.217726595, 45.775374384), (-7.104183749, 49.83302242))
            ThreePointArc((-7.104183749, 49.83302242), (-6.454943705, 49.375251561), (-5.844735322, 48.866613652))
            Line((-5.844735322, 48.866613652), (-8.958278167, 44.808965616))
            ThreePointArc((-8.958278167, 44.808965616), (-9.547451764, 45.345016593), (-10.217726595, 45.775374384))
        make_face()
    extrude(amount=-CUT_EXTRUDE63_DEPTH, mode=Mode.SUBTRACT)


with BuildPart() as body_2:
    # Sketch116 → Boss-Extrude32 (new body)
    with BuildSketch(Plane(origin=(0, 28.575, 0), x_dir=(1, 0, 0), z_dir=(0, 1, 0)).offset(BOSS_EXTRUDE32_START)):
        Polygon((-25.4, -66.802), (25.4, -66.802), (47.397045256, -104.902), (37.31895, -122.357773027), (37.31895, -143.002), (37.31895, -152.4), (12.4206, -152.4), (12.4206, -155.5496), (-12.4206, -155.5496), (-12.4206, -152.4), (-37.31895, -152.4), (-37.31895, -143.002), (-37.31895, -122.357773027), (-47.397045256, -104.902), align=None)
        with Locations(Location((30.96895, -147.7645, 0), (0, 0, 270))):
            Circle(SKETCH116_R, mode=Mode.SUBTRACT)
        with Locations(Location((-30.96895, -147.7645, 0), (0, 0, 90))):
            Circle(SKETCH116_R, mode=Mode.SUBTRACT)
        with Locations(Location((20.6375, -71.5645, 0), (0, 0, 270))):
            Circle(SKETCH116_R, mode=Mode.SUBTRACT)
        with Locations(Location((-20.6375, -71.5645, 0), (0, 0, 270))):
            Circle(SKETCH116_R, mode=Mode.SUBTRACT)
    extrude(amount=BOSS_EXTRUDE32_DEPTH)

    # Sketch118 → Boss-Extrude33 (add)
    with BuildSketch(Plane(origin=(0, 30.734, 0), x_dir=(1, 0, 0), z_dir=(0, 1, 0)).offset(BOSS_EXTRUDE33_START)):
        with BuildLine():
            Line((10.280494061, -21.726298825), (-7.834850838, -35.626691862))
            ThreePointArc((-7.834850838, -35.626691862), (-8.790052591, -37.200993094), (-8.430538117, -39.006978725))
            ThreePointArc((-8.430538117, -39.006978725), (-9.547451764, -45.345016593), (-15.958604753, -44.783467422))
            ThreePointArc((-15.958604753, -44.783467422), (-17.610003723, -43.96877963), (-19.377886346, -44.483974531))
            Line((-19.377886346, -44.483974531), (-34.027546755, -55.725054327))
            ThreePointArc((-34.027546755, -55.725054327), (-34.700321183, -56.095022456), (-35.452908035, -56.247058232))
            ThreePointArc((-35.452908035, -56.247058232), (-41.29836226, -60.999749867), (-38.49041558, -67.990661703))
            Line((-38.49041558, -67.990661703), (-29.3497017, -73.64308402))
            Line((-29.3497017, -73.64308402), (-25.4, -66.802))
            Line((-25.4, -66.802), (25.4, -66.802))
            Line((25.4, -66.802), (16.356889842, -51.138873748))
            ThreePointArc((16.356889842, -51.138873748), (14.255494678, -38.410910939), (21.067711154, -27.455975724))
            ThreePointArc((21.067711154, -27.455975724), (20.854631298, -17.223825423), (11.153621759, -20.484610104))
            ThreePointArc((11.153621759, -20.484610104), (10.811982667, -21.172203427), (10.280494061, -21.726298825))
        make_face()
        with Locations(Location((17.20207608, -22.418182013, 0), (0, 0, 270))):
            Circle(SKETCH118_R, mode=Mode.SUBTRACT)
        with Locations(Location((-35.150676163, -62.589861704, 0), (0, 0, 270))):
            Circle(SKETCH118_R, mode=Mode.SUBTRACT)
        with BuildLine():
            Line((-5.00888, -60.19546), (-5.00888, -61.78296))
            ThreePointArc((-5.00888, -61.78296), (-1.83388, -64.95796), (1.34112, -61.78296))
            Line((1.34112, -61.78296), (1.34112, -60.19546))
            ThreePointArc((1.34112, -60.19546), (-1.83388, -57.02046), (-5.00888, -60.19546))
        make_face(mode=Mode.SUBTRACT)
    extrude(amount=-BOSS_EXTRUDE33_DEPTH)

    # DeleteFace1 outline → DeleteFace1 (add)
    with BuildSketch(Plane(origin=(0, 0, 0), x_dir=(1, 0, 0), z_dir=(0, 1, 0)).offset(DELETEFACE1_START)):
        with Locations((20.6375, -71.5645)):
            Circle(DELETEFACE1_OUTLINE_R)
        with Locations((-20.6375, -71.5645)):
            Circle(DELETEFACE1_OUTLINE_R)
    extrude(amount=DELETEFACE1_DEPTH)

    # Fillet44
    fillet44_edges = [body_2.edges().sort_by_distance(p)[0] for p in [
        (47.397045256, 32.3215, 104.902),
        (37.31895, 32.3215, 122.357773027),
        (-37.31895, 32.3215, 122.357773027),
        (-47.397045256, 32.3215, 104.902),
        (-29.3497017, 32.3215, 73.64308402),
    ]]
    fillet(fillet44_edges, radius=FILLET44_R)

    # Fillet49
    fillet49_edges = [body_2.edges().sort_by_distance(p)[0] for p in [
        (37.31895, 32.3215, 152.4),
        (-37.31895, 32.3215, 152.4),
    ]]
    fillet(fillet49_edges, radius=FILLET49_R)


with BuildPart() as cut_extrude63_piece_1:
    # of the separate pieces the step leaves, piece 1, a body of its own (cut_extrude63_pieces)
    add(part.part.solids().sort_by_distance((26.919769024, 25.4, 152.4))[0])

    # Fillet46
    fillet46_edges = [cut_extrude63_piece_1.edges().sort_by_distance(p)[0] for p in [
        (-5.844735322, 26.9875, 48.866613652),
        (-8.958278167, 26.9875, 44.808965616),
    ]]
    fillet(fillet46_edges, radius=FILLET46_R)

    # Fillet48
    fillet48_edges = [cut_extrude63_piece_1.edges().sort_by_distance(p)[0] for p in [
        (3.843489743, 26.9875, 34.669585789),
        (-2.773809056, 26.9875, 39.747217744),
    ]]
    fillet(fillet48_edges, radius=FILLET48_R)


with BuildPart() as cut_extrude63_piece_2:
    # of the separate pieces the step leaves, piece 2, a body of its own (cut_extrude63_pieces)
    add(part.part.solids().sort_by_distance((-16.707657981, 25.4, 50.439036071))[0])

    # Sketch121 → Cut-Extrude64 (cut, through all)
    with BuildSketch(Plane.XZ.offset(-25.4)):
        with BuildLine():
            Line((-28.719749725, 51.652238419), (-24.854114651, 56.69003213))
            Line((-24.854114651, 56.69003213), (-16.707657981, 50.439036071))
            ThreePointArc((-16.707657981, 50.439036071), (-11.826813979, 51.389632918), (-7.104183749, 49.83302242))
            Line((-7.104183749, 49.83302242), (-10.217726595, 45.775374384))
            ThreePointArc((-10.217726595, 45.775374384), (-13.257527132, 46.259637328), (-15.958604753, 44.783467422))
            ThreePointArc((-15.958604753, 44.783467422), (-17.610003723, 43.96877963), (-19.377886346, 44.483974531))
            Line((-19.377886346, 44.483974531), (-28.719749725, 51.652238419))
        make_face()
    extrude(amount=-CUT_EXTRUDE64_DEPTH, mode=Mode.SUBTRACT)

    # Fillet45
    fillet45_edges = [cut_extrude63_piece_2.edges().sort_by_distance(p)[0] for p in [
        (-24.854114651, 26.9875, 56.69003213),
        (-28.719749725, 26.9875, 51.652238419),
    ]]
    fillet(fillet45_edges, radius=FILLET45_R)

    # Fillet47
    fillet47_edges = [cut_extrude63_piece_2.edges().sort_by_distance(p)[0] for p in [
        (-28.410372496, 26.9875, 77.220674902),
        (-28.410372496, 26.9875, 59.418844751),
    ]]
    fillet(fillet47_edges, radius=FILLET47_R)


with BuildPart() as body_4:
    # Sketch122 → Boss-Extrude34 (new body)
    with BuildSketch(Plane(origin=(0, 28.575, 0), x_dir=(1, 0, 0), z_dir=(0, 1, 0))):
        with BuildLine():
            Line((32.670427372, -117.709250399), (40.064696837, -104.902))
            Line((40.064696837, -104.902), (10.857628528, -54.313873748))
            ThreePointArc((10.857628528, -54.313873748), (7.556793363, -41.589482586), (11.262241834, -28.976977092))
            Line((11.262241834, -28.976977092), (-1.660608663, -38.893029039))
            ThreePointArc((-1.660608663, -38.893029039), (-5.68181669, -50.382810304), (-17.820858374, -51.293224775))
            Line((-17.820858374, -51.293224775), (-29.306444608, -60.106425066))
            ThreePointArc((-29.306444608, -60.106425066), (-28.823969902, -63.133265681), (-29.815524153, -66.033501209))
            ThreePointArc((-29.815524153, -66.033501209), (-25.428001423, -73.566513401), (-26.930897762, -82.153592705))
            Line((-26.930897762, -82.153592705), (-40.064696837, -104.902))
            Line((-40.064696837, -104.902), (-32.670427372, -117.709250399))
            ThreePointArc((-32.670427372, -117.709250399), (-31.401692006, -120.772248526), (-30.96895, -124.059250399))
            Line((-30.96895, -124.059250399), (-30.96895, -141.4145))
            ThreePointArc((-30.96895, -141.4145), (-25.063108612, -145.43136102), (-26.629060629, -152.4))
            Line((-26.629060629, -152.4), (-34.77895, -152.4))
            ThreePointArc((-34.77895, -152.4), (-36.575001224, -151.656051224), (-37.31895, -149.86))
            Line((-37.31895, -149.86), (-37.31895, -124.059250399))
            ThreePointArc((-37.31895, -124.059250399), (-37.535321003, -122.415749463), (-38.169688686, -120.884250399))
            Line((-38.169688686, -120.884250399), (-45.563958151, -108.077))
            ThreePointArc((-45.563958151, -108.077), (-46.414696837, -104.902), (-45.563958151, -101.727))
            Line((-45.563958151, -101.727), (-32.430159076, -78.978592705))
            ThreePointArc((-32.430159076, -78.978592705), (-31.771655383, -74.252970213), (-34.589680973, -70.402792707))
            Line((-34.589680973, -70.402792707), (-38.49041558, -67.990661703))
            ThreePointArc((-38.49041558, -67.990661703), (-41.29836226, -60.999749867), (-35.452908035, -56.247058232))
            ThreePointArc((-35.452908035, -56.247058232), (-34.700321183, -56.095022456), (-34.027546755, -55.725054327))
            Line((-34.027546755, -55.725054327), (-19.377886346, -44.483974531))
            ThreePointArc((-19.377886346, -44.483974531), (-17.610003723, -43.96877963), (-15.958604753, -44.783467422))
            ThreePointArc((-15.958604753, -44.783467422), (-9.547451764, -45.345016593), (-8.430538117, -39.006978725))
            ThreePointArc((-8.430538117, -39.006978725), (-8.790052591, -37.200993094), (-7.834850838, -35.626691862))
            Line((-7.834850838, -35.626691862), (10.280494061, -21.726298825))
            ThreePointArc((10.280494061, -21.726298825), (10.811982667, -21.172203427), (11.153621759, -20.484610104))
            ThreePointArc((11.153621759, -20.484610104), (20.854631298, -17.223825423), (21.067711154, -27.455975724))
            ThreePointArc((21.067711154, -27.455975724), (14.255494678, -38.410910939), (16.356889842, -51.138873748))
            Line((16.356889842, -51.138873748), (45.563958151, -101.727))
            ThreePointArc((45.563958151, -101.727), (46.414696837, -104.902), (45.563958151, -108.077))
            Line((45.563958151, -108.077), (38.169688686, -120.884250399))
            ThreePointArc((38.169688686, -120.884250399), (37.535321003, -122.415749463), (37.31895, -124.059250399))
            Line((37.31895, -124.059250399), (37.31895, -149.86))
            ThreePointArc((37.31895, -149.86), (36.575001224, -151.656051224), (34.77895, -152.4))
            Line((34.77895, -152.4), (26.629060629, -152.4))
            ThreePointArc((26.629060629, -152.4), (25.063108612, -145.43136102), (30.96895, -141.4145))
            Line((30.96895, -141.4145), (30.96895, -124.059250399))
            ThreePointArc((30.96895, -124.059250399), (31.401692006, -120.772248526), (32.670427372, -117.709250399))
        make_face()
        with Locations(Location((17.20207608, -22.418182013, 0), (0, 0, 90))):
            Circle(SKETCH122_R, mode=Mode.SUBTRACT)
        with Locations(Location((-35.150676163, -62.589861704, 0), (0, 0, 90))):
            Circle(SKETCH122_R, mode=Mode.SUBTRACT)
        with Locations(Location((-30.96895, -147.7645, 0), (0, 0, 90))):
            Circle(SKETCH122_R, mode=Mode.SUBTRACT)
        with Locations(Location((30.96895, -147.7645, 0), (0, 0, 90))):
            Circle(SKETCH122_R, mode=Mode.SUBTRACT)
    extrude(amount=BOSS_EXTRUDE34_DEPTH)


solid = body_4.part
